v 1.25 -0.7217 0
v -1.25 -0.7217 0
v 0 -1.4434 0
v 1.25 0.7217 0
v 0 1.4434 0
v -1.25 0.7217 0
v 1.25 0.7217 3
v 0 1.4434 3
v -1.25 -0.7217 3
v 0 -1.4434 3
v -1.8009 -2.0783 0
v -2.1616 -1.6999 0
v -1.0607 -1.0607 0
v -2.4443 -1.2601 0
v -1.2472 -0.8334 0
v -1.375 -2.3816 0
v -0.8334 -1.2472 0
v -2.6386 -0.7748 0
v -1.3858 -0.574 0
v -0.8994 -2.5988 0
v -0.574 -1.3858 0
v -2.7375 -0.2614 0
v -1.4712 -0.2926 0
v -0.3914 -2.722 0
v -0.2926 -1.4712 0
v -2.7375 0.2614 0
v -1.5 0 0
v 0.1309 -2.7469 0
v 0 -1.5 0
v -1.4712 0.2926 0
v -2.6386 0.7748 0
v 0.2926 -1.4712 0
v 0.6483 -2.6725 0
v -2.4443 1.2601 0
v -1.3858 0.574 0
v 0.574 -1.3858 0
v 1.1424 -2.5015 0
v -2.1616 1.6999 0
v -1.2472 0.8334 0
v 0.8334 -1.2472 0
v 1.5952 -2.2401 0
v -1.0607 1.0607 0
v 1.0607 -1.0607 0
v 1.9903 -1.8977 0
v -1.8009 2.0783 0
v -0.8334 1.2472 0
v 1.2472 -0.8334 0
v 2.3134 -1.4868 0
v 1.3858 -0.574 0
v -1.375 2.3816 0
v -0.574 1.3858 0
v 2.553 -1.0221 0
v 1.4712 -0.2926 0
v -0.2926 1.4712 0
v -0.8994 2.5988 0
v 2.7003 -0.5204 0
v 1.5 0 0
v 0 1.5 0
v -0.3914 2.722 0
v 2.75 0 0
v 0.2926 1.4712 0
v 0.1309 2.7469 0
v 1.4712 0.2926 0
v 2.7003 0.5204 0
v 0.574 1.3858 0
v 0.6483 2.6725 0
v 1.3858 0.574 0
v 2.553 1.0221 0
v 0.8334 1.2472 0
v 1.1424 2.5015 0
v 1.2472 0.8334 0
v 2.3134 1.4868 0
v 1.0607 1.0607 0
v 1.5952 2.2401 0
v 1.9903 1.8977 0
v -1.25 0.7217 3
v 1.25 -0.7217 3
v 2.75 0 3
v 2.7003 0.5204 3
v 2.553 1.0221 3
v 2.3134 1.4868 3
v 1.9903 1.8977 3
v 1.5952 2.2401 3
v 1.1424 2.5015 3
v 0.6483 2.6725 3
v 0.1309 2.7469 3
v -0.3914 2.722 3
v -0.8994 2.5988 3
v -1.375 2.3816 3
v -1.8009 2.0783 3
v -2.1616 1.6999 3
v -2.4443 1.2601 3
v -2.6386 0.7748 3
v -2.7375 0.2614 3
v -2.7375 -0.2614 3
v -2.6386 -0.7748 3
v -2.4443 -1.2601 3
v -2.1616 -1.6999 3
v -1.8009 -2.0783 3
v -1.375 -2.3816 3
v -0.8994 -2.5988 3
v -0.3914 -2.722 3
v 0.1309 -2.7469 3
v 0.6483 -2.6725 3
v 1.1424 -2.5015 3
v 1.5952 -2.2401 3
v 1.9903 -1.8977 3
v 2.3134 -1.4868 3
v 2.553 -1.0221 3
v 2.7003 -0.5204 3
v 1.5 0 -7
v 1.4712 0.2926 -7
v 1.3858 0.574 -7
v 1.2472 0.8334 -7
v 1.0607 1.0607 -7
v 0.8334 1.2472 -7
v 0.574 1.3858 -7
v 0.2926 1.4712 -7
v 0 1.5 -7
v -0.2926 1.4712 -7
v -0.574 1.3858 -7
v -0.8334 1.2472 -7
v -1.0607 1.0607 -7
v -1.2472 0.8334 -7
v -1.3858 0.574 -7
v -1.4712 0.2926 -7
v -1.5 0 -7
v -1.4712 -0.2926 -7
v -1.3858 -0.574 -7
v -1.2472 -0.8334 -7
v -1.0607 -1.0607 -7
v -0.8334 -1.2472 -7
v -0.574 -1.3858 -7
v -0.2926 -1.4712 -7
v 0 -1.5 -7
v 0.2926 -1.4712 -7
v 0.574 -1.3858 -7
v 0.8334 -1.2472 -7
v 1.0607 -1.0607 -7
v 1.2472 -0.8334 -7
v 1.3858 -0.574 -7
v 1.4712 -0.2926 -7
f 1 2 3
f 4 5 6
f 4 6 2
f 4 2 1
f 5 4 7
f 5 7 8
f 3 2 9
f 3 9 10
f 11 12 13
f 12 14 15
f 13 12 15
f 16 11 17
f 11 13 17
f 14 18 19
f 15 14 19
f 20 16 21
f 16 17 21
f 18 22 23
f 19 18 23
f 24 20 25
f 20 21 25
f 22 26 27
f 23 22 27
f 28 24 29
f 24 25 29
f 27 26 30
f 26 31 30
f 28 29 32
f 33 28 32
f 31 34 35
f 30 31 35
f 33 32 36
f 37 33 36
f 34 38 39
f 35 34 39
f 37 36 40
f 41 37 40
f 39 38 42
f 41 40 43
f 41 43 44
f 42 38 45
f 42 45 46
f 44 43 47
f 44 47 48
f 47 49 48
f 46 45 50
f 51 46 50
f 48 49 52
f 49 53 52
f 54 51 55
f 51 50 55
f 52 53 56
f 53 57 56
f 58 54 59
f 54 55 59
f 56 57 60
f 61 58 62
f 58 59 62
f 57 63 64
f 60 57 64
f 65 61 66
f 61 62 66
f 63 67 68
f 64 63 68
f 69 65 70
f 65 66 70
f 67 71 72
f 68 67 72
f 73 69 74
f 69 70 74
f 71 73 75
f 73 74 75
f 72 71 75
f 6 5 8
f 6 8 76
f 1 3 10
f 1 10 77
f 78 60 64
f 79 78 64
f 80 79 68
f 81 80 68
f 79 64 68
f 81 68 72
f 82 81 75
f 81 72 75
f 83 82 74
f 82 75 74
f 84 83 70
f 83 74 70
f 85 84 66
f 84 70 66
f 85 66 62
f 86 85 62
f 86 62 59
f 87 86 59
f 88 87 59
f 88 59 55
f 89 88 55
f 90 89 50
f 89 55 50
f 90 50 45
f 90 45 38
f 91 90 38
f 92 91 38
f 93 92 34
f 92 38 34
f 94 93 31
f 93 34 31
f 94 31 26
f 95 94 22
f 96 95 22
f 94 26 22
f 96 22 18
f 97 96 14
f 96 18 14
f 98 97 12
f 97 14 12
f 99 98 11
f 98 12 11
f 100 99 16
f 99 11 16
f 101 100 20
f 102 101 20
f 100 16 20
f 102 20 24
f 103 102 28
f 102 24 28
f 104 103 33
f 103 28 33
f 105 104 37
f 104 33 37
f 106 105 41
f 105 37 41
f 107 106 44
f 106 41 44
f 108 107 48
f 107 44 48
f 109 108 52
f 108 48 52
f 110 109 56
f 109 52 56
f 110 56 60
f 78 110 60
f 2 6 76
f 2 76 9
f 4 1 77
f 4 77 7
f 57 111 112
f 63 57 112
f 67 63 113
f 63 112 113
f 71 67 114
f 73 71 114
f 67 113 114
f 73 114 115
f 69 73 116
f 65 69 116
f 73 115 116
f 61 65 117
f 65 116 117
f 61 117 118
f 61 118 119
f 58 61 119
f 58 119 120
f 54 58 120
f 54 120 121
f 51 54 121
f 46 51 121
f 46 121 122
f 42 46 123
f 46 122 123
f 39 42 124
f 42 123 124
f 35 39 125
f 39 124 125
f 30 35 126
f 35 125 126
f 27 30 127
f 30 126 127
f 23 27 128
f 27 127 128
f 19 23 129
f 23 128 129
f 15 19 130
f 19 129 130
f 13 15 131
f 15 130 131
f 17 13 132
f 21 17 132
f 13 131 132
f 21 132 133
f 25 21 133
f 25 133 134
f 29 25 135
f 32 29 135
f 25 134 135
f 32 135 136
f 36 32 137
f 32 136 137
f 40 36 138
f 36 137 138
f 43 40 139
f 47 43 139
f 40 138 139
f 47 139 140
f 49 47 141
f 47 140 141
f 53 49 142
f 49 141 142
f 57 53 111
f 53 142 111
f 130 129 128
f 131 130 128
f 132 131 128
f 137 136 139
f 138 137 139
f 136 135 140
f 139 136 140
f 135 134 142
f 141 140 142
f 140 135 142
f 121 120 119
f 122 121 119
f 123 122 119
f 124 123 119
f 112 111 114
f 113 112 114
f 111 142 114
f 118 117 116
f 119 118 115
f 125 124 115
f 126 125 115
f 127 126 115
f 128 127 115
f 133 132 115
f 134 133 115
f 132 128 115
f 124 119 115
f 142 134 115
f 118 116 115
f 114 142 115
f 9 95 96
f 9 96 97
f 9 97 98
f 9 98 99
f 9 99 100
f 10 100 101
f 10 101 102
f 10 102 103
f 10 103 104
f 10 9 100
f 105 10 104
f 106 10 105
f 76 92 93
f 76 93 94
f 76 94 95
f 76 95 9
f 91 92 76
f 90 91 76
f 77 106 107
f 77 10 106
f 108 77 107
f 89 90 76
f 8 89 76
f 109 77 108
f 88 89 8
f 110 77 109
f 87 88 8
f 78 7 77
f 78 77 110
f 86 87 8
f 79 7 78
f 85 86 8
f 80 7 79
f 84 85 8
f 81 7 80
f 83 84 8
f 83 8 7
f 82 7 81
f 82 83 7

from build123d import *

# Parameters (mm, degrees)
THREAD_ENVELOPE_START = -7
PROFILE_1_R           = 1.5
THREAD_ENVELOPE_DEPTH = 7
PROFILE_2_R           = 2.75
SOCKET_HEAD_DEPTH     = 3


with BuildPart() as part:
    # Profile_1 → Thread_envelope (new body)
    with BuildSketch(Plane.XY.offset(THREAD_ENVELOPE_START)):
        Circle(PROFILE_1_R)
    extrude(amount=THREAD_ENVELOPE_DEPTH)

    # Profile_2 → Socket_head (add)
    with BuildSketch(Plane.XY):
        Circle(PROFILE_2_R)
        Polygon((1.25, 0.721687836), (0, 1.443375673), (-1.25, 0.721687836), (-1.25, -0.721687836), (0, -1.443375673), (1.25, -0.721687836), align=None, mode=Mode.SUBTRACT)
    extrude(amount=SOCKET_HEAD_DEPTH)


solid = part.part
